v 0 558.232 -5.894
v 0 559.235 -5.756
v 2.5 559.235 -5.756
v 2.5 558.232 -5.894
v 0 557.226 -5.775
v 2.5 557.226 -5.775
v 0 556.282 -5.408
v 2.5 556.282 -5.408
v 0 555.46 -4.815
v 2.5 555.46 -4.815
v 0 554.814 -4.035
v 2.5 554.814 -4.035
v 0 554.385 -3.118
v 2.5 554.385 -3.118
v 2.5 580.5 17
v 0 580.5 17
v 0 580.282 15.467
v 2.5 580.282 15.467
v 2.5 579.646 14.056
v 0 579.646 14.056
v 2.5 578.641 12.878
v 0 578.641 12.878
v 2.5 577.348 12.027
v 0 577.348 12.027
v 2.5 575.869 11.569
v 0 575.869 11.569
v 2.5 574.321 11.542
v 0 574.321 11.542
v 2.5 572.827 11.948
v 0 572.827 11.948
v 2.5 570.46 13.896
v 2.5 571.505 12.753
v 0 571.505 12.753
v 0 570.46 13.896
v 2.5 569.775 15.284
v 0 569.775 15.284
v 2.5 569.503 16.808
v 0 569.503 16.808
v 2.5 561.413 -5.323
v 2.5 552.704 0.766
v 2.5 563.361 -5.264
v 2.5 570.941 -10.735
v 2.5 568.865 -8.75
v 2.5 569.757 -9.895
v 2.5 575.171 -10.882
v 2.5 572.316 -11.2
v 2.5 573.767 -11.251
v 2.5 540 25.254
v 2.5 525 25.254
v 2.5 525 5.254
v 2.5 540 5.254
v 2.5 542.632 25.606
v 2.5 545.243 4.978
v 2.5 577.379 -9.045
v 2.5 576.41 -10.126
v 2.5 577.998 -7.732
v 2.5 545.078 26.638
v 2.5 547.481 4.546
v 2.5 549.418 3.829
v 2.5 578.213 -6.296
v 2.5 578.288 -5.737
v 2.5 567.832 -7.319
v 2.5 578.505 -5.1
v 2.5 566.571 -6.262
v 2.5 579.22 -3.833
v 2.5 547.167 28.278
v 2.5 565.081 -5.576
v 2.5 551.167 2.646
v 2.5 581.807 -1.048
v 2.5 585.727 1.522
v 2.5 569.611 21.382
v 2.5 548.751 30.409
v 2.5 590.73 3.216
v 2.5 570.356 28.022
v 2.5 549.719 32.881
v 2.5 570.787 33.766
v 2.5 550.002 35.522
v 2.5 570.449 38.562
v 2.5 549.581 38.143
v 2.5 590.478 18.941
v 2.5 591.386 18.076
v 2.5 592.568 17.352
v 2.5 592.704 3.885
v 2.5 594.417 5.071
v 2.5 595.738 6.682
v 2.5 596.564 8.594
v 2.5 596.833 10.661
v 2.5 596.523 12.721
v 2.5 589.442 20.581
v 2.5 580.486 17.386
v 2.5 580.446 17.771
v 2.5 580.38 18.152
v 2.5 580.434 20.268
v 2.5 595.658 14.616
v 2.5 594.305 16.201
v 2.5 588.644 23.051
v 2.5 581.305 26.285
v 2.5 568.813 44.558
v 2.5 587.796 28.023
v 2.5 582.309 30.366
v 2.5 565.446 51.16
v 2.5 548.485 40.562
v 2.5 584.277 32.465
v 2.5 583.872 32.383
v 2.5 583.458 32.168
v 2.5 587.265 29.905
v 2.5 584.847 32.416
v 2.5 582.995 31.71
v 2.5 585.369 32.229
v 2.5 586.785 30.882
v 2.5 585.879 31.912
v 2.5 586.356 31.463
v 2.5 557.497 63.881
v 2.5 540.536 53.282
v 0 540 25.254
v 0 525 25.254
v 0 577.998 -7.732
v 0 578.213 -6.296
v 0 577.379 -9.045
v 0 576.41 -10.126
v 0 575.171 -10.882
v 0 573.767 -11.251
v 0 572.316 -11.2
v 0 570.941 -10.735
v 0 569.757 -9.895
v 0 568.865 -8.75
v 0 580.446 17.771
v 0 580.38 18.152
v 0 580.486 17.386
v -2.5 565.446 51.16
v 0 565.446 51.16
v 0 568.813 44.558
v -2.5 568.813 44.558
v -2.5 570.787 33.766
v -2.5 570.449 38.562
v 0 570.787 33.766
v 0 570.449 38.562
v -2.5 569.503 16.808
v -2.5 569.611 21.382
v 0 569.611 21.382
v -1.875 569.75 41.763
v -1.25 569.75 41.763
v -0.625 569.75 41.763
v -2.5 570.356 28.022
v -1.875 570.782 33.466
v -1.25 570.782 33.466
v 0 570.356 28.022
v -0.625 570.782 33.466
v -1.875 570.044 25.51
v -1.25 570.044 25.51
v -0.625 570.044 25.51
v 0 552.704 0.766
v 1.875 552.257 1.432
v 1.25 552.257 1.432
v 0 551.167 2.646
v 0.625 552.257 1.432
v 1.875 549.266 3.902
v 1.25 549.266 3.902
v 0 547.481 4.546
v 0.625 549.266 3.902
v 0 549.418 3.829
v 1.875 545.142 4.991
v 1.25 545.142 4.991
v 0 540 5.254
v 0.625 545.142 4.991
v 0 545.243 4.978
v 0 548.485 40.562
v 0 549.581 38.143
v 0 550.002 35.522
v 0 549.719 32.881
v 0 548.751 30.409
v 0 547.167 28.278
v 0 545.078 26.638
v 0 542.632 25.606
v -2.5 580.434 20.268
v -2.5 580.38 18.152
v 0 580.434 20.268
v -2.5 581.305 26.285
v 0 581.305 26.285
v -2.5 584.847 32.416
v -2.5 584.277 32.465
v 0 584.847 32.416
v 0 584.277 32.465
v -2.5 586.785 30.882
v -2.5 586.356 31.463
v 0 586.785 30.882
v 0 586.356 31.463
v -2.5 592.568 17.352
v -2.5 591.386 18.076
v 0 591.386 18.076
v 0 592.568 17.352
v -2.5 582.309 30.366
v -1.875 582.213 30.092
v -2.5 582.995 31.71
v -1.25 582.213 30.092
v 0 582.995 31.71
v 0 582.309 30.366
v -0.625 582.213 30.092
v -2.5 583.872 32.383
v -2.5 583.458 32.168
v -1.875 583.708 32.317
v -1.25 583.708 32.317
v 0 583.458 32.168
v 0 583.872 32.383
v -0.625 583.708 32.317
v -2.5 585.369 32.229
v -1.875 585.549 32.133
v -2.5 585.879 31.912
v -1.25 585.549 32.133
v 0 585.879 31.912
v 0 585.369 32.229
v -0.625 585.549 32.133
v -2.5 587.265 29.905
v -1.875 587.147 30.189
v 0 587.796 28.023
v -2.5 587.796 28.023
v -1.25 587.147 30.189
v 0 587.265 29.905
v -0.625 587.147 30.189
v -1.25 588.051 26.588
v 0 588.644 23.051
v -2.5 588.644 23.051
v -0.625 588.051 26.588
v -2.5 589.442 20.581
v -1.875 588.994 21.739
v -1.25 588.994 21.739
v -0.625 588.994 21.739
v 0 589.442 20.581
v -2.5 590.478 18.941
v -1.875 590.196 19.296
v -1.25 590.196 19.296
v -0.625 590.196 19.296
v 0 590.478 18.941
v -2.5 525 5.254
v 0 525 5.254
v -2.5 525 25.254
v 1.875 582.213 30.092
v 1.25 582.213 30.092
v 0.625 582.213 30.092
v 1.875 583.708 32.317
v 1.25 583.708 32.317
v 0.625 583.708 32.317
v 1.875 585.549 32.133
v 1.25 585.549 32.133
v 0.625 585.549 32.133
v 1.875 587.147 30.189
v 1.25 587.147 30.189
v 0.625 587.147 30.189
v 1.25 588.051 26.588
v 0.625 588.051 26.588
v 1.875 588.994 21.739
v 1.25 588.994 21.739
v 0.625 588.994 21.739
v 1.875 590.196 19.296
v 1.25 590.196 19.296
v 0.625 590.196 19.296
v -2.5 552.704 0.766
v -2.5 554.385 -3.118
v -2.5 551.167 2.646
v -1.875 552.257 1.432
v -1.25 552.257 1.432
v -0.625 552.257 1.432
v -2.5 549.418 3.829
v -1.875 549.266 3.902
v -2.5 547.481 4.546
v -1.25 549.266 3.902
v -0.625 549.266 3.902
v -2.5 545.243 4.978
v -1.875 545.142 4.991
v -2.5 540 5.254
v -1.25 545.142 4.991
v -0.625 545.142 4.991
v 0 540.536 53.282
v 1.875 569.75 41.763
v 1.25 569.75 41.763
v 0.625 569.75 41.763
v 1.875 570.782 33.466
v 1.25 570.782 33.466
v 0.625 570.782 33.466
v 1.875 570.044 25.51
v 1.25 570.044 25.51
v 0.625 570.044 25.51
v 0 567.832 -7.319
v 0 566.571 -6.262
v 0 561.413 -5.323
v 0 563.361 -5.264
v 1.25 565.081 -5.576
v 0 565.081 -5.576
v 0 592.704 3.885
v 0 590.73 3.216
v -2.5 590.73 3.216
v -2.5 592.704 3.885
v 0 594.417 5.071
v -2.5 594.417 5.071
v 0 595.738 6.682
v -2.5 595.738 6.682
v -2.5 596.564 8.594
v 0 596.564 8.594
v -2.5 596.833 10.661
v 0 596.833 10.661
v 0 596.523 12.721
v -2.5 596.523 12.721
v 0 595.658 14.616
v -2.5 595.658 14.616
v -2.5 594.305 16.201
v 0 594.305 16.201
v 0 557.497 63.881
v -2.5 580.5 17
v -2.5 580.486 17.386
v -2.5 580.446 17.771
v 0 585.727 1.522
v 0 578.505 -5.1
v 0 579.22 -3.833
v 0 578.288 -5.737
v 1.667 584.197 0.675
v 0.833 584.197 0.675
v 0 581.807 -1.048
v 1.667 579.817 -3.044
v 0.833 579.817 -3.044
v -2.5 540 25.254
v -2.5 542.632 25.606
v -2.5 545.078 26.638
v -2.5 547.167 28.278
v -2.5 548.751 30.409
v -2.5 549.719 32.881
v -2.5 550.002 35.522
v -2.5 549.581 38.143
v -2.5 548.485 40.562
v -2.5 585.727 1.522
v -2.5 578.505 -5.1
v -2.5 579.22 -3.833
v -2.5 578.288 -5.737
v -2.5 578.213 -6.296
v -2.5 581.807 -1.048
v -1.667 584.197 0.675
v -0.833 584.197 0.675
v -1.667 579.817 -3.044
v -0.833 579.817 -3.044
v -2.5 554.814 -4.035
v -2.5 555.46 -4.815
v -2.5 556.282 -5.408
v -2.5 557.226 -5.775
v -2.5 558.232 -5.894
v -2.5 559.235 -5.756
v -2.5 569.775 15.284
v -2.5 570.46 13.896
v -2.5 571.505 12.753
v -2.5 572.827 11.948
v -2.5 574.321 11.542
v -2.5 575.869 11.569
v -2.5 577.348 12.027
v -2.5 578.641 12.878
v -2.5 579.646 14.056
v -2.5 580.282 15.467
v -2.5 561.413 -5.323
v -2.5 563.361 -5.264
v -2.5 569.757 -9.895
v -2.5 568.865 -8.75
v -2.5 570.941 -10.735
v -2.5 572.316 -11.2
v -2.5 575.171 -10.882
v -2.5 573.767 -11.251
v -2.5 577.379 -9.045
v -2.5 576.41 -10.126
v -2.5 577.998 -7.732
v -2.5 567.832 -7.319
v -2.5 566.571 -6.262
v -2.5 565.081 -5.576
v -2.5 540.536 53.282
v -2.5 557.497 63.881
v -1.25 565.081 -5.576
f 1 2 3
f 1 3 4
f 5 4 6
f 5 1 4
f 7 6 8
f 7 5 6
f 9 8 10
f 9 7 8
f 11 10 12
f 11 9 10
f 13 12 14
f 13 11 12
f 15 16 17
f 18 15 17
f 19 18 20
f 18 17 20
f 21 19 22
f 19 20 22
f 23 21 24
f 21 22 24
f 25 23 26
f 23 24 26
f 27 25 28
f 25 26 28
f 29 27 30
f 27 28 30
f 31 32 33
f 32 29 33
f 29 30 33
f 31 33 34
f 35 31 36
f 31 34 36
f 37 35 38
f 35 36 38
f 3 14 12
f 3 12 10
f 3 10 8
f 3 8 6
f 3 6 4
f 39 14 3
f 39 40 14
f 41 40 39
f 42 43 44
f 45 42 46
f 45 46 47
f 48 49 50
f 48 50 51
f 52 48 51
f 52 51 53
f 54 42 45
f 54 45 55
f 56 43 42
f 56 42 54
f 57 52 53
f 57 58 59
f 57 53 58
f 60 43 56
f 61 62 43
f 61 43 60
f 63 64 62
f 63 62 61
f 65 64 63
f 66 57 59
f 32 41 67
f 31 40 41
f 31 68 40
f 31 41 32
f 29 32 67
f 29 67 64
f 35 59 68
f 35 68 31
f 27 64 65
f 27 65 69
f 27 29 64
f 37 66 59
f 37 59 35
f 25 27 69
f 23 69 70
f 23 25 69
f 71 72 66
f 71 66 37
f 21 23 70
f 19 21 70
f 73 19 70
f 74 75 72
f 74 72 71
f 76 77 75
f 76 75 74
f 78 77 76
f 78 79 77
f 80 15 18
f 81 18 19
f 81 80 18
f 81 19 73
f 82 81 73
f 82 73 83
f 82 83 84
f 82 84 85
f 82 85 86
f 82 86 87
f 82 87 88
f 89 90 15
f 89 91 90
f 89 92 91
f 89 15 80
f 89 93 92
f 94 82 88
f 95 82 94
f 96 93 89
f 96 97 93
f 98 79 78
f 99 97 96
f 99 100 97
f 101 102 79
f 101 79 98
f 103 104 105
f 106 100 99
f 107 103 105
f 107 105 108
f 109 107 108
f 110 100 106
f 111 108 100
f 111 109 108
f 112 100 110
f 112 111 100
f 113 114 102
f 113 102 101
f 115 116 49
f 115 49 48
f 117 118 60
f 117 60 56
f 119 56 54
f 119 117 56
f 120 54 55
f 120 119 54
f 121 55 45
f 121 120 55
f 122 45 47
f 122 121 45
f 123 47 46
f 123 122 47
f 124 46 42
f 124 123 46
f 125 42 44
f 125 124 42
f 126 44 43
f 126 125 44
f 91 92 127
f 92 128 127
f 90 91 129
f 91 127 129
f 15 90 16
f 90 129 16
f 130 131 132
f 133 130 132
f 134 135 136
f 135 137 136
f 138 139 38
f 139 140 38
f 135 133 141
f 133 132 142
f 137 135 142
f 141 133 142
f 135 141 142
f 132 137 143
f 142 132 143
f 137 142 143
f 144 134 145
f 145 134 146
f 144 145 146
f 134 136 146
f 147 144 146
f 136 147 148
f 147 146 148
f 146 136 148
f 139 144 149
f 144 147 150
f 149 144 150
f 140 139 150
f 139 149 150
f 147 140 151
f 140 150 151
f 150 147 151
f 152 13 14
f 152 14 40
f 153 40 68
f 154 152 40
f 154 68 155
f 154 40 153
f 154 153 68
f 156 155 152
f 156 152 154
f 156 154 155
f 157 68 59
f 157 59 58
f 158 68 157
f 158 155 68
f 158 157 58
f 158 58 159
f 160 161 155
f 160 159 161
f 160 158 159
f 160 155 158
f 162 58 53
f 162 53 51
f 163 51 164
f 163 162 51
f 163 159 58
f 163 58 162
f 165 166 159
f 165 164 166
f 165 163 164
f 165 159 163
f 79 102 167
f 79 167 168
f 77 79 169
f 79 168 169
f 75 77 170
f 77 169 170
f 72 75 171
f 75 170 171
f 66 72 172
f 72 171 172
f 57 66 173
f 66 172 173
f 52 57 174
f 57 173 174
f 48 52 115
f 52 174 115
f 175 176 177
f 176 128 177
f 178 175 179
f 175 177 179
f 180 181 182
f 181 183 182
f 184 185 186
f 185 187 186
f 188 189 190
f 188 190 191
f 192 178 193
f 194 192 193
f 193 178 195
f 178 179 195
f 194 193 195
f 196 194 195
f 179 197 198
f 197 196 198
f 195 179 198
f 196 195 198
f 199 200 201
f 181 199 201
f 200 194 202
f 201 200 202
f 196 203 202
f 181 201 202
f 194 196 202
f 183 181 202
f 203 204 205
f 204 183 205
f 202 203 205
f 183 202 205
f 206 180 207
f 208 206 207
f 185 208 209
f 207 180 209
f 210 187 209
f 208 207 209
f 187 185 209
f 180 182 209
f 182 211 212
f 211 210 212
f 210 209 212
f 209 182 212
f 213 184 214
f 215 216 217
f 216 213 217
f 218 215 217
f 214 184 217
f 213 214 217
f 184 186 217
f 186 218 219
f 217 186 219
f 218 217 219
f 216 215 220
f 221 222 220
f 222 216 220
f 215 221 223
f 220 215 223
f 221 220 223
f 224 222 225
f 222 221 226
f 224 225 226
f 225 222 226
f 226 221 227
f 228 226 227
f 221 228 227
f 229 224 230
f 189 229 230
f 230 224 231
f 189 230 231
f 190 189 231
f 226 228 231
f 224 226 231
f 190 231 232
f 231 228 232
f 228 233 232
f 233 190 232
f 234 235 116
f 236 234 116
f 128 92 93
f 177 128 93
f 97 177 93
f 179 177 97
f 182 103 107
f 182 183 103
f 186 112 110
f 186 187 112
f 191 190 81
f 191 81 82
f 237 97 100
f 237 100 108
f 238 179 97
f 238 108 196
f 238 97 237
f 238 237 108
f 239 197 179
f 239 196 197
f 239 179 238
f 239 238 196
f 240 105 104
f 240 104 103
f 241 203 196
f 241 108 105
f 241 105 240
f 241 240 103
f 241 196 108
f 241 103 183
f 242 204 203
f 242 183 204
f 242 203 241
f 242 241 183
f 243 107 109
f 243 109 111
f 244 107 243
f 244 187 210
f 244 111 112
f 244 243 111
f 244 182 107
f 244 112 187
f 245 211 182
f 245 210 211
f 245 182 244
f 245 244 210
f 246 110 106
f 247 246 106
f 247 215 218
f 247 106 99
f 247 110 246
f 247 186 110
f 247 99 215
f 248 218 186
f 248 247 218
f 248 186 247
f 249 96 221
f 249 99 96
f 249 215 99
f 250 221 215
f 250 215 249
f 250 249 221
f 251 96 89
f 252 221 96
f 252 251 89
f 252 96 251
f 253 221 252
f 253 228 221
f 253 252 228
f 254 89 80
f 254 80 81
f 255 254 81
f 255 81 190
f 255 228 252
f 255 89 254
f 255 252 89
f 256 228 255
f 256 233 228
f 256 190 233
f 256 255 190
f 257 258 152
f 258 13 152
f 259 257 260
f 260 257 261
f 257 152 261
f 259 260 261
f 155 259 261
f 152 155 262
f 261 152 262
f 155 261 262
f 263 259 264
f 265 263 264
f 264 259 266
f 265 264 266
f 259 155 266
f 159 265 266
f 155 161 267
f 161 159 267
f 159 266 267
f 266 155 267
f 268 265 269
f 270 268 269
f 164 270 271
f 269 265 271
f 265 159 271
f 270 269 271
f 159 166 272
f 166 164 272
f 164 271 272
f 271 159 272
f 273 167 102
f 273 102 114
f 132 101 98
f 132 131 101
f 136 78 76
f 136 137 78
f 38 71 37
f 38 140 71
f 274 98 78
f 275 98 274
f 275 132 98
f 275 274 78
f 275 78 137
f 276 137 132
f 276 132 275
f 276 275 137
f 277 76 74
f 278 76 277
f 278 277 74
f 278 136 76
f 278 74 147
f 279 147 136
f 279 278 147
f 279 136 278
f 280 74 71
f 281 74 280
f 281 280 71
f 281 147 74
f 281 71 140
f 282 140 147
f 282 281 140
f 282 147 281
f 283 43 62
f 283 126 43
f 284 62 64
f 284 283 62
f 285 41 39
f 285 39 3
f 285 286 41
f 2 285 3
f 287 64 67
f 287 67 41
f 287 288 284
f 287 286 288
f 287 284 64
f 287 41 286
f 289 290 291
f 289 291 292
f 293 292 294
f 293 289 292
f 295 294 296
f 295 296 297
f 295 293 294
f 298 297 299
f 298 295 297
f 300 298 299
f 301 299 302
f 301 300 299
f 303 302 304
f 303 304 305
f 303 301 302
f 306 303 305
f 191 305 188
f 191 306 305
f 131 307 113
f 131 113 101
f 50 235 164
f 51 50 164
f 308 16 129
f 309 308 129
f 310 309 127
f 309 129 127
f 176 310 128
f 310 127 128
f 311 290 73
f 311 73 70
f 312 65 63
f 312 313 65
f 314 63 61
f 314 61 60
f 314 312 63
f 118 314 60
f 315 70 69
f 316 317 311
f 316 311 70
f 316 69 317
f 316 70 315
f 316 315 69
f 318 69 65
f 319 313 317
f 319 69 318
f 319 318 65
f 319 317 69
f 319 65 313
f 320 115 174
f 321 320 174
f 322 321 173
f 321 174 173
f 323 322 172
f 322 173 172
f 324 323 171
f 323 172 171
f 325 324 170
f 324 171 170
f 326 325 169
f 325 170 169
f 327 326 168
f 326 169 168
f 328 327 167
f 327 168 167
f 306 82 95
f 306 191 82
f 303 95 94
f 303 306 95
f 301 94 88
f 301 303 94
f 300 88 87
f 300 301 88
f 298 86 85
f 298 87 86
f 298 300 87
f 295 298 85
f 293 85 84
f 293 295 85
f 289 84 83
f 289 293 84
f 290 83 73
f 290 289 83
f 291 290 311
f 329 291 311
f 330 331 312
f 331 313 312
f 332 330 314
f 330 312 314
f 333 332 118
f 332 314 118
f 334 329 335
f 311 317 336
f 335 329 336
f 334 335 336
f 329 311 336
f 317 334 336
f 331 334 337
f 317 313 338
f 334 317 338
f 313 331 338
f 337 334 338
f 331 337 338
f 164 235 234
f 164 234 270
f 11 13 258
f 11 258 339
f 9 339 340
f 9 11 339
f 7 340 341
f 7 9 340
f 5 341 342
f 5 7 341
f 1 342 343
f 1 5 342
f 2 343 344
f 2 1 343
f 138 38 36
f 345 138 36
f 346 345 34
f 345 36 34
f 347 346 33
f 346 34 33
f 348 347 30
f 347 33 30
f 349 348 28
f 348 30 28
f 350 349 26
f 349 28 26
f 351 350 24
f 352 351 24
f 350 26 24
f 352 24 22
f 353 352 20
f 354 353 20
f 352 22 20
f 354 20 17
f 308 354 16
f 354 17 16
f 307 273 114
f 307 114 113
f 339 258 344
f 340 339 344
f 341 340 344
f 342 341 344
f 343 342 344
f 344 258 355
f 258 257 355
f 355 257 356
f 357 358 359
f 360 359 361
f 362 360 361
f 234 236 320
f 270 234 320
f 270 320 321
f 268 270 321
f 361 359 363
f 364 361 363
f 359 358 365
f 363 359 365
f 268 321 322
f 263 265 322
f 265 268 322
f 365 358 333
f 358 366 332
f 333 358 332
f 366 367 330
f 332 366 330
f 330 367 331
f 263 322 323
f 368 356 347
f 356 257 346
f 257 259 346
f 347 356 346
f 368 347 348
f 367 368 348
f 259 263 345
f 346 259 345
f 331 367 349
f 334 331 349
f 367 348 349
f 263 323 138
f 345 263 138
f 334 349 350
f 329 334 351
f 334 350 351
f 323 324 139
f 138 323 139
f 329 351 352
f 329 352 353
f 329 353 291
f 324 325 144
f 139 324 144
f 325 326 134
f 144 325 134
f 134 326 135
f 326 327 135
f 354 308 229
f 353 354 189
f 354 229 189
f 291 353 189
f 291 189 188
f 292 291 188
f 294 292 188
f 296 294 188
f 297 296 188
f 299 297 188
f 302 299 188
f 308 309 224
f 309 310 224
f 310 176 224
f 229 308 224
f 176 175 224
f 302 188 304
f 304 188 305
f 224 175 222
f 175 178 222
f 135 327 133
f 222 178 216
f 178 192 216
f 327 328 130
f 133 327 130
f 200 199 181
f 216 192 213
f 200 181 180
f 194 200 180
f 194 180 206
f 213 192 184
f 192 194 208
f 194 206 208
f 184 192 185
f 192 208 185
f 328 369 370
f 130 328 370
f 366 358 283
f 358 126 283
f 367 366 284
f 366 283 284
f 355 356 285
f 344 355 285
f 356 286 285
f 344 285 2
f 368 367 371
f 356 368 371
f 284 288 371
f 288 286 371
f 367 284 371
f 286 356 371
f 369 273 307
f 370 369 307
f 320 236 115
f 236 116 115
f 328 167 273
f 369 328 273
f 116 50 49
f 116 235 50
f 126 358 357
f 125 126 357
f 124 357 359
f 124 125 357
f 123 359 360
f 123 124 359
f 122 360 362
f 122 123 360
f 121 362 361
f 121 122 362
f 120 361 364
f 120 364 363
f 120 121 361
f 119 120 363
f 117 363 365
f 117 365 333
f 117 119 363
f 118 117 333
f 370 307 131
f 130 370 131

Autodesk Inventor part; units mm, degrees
ref_plane "YZ Plane" through (0, 0, 0) normal (1, 0, 0) x (0, 1, 0)
ref_plane "XZ Plane" through (0, 0, 0) normal (0, 1, 0) x (-1, 0, 0)
ref_plane "XY Plane" through (0, 0, 0) normal (0, 0, 1) x (1, 0, 0)
sketch "Boceto1" plane through (0, 0, 0) normal (1, 0, 0) x (0, 1, 0)
  line L0 (525, 5.254) -> (525, 25.254)
  line L1 (525, 25.254) -> (540, 25.254)
  arc A0 (540, 25.254) -> (548.4852, 40.5618) centre (540, 35.2596) ccw
  line L2 (548.4852, 40.5618) -> (540.5364, 53.2825)
  line L3 (540.5364, 53.2825) -> (557.4974, 63.8809)
  line L4 (557.4974, 63.8809) -> (565.4462, 51.1602)
  line L5 (525, 15.254) -> (575, 17.0001) construction
  line L6 (549.0169, 58.5817) -> (575, 17.0001) construction
  line L7 (525, 5.254) -> (540, 5.254)
  circle A1 centre (575, 17.0001) radius 5.5
  line L8 (565.4462, 51.1602) -> (571.7687, 41.0421) construction
  line L9 (569.1709, 26.3286) -> (569.5034, 16.8081) construction
  spline S0 degree 4 poles (565.4462, 51.1602) (571.7687, 41.0421) (572.3019, 33) (569.1709, 26.3286) (569.5034, 16.8081) knots 1 1 1 1 1 2 2 2 2 2
  line L10 (580.3797, 18.1518) -> (580.12, 19.0089) construction
  line L11 (580.12, 19.0089) -> (581.7415, 30.4088) construction
  line L12 (581.7415, 30.4088) -> (583, 33.7094) construction
  line L13 (583, 33.7094) -> (588.2679, 31.7007) construction
  line L14 (588.2679, 31.7007) -> (588, 24.7089) construction
  line L15 (588, 24.7089) -> (589.3884, 18.8714) construction
  line L16 (545.515, 5.254) -> (540, 5.254) construction
  line L17 (571.7687, 41.0421) -> (572.3019, 33) construction
  line L18 (572.3019, 33) -> (569.1709, 26.3286) construction
  arc A2 (590.7303, 3.2162) -> (592.5678, 17.3517) centre (589.3333, 10.585) ccw
  arc A3 (568.8646, -8.7498) -> (578.2128, -6.2962) centre (573.2128, -6.2813) ccw
  arc A4 (554.3846, -3.118) -> (559.2353, -5.7559) centre (558.1928, -1.8941) ccw
  spline S1 degree 4 poles (580.3797, 18.1518) (580.12, 19.0089) (581.7415, 30.4088) (583, 33.7094) (588.2679, 31.7007) (588, 24.7089) (589.3884, 18.8714) (592.5678, 17.3517) knots 0 0 0 0 0 1 2 3 4 4 4 4 4
  line L19 (589.3884, 18.8714) -> (592.5678, 17.3517) construction
  spline S2 degree 4 poles (554.3846, -3.118) (552.5025, 2.7386) (550.3005, 4.7218) (545.515, 5.254) (540, 5.254) knots 21.570729 21.570729 21.570729 21.570729 21.570729 22 22 22 22 22
  line L20 (554.3846, -3.118) -> (552.5025, 2.7386) construction
  line L21 (552.5025, 2.7386) -> (550.3005, 4.7218) construction
  line L22 (550.3005, 4.7218) -> (545.515, 5.254) construction
  line L23 (568.8646, -8.7498) -> (566.1112, -3.8997) construction
  line L24 (566.1112, -3.8997) -> (559.2353, -5.7559) construction
  spline S3 degree 2 poles (568.8646, -8.7498) (566.1112, -3.8997) (559.2353, -5.7559) knots 1 1 1 2 2 2
  line L25 (575, 17.0001) -> (525, 17.0001) construction
  line L26 (590.7303, 3.2162) -> (583.3288, 1.8131) construction
  line L27 (583.3288, 1.8131) -> (578.2201, -3.8262) construction
  line L28 (578.2201, -3.8262) -> (578.2128, -6.2962) construction
  spline S4 degree 3 poles (590.7303, 3.2162) (583.3288, 1.8131) (578.2201, -3.8262) (578.2128, -6.2962) knots 1 1 1 1 2 2 2 2
  point P0 (0, 0)
  point P1 (580.3691, 18.1927)
  point P2 (571.0023, 16.8632)
  dimension "d0" = 20
  dimension "d1" = 60
  dimension "d2" = 15
  dimension "d3" = 11
  dimension "d4" = 15
  dimension "d5" = 10
  dimension "d6" = 8
  dimension "d7" = 2
  dimension "d8" = 50
extrude "Extrusión1" add sketch "Boceto1" along normal mid plane 5 contours L0 L1 A0 L2 L3 L4 S0 A1 S1 A2 S4 A3 S3 A4 S2 L7
properties part number "lamina_trasero"
